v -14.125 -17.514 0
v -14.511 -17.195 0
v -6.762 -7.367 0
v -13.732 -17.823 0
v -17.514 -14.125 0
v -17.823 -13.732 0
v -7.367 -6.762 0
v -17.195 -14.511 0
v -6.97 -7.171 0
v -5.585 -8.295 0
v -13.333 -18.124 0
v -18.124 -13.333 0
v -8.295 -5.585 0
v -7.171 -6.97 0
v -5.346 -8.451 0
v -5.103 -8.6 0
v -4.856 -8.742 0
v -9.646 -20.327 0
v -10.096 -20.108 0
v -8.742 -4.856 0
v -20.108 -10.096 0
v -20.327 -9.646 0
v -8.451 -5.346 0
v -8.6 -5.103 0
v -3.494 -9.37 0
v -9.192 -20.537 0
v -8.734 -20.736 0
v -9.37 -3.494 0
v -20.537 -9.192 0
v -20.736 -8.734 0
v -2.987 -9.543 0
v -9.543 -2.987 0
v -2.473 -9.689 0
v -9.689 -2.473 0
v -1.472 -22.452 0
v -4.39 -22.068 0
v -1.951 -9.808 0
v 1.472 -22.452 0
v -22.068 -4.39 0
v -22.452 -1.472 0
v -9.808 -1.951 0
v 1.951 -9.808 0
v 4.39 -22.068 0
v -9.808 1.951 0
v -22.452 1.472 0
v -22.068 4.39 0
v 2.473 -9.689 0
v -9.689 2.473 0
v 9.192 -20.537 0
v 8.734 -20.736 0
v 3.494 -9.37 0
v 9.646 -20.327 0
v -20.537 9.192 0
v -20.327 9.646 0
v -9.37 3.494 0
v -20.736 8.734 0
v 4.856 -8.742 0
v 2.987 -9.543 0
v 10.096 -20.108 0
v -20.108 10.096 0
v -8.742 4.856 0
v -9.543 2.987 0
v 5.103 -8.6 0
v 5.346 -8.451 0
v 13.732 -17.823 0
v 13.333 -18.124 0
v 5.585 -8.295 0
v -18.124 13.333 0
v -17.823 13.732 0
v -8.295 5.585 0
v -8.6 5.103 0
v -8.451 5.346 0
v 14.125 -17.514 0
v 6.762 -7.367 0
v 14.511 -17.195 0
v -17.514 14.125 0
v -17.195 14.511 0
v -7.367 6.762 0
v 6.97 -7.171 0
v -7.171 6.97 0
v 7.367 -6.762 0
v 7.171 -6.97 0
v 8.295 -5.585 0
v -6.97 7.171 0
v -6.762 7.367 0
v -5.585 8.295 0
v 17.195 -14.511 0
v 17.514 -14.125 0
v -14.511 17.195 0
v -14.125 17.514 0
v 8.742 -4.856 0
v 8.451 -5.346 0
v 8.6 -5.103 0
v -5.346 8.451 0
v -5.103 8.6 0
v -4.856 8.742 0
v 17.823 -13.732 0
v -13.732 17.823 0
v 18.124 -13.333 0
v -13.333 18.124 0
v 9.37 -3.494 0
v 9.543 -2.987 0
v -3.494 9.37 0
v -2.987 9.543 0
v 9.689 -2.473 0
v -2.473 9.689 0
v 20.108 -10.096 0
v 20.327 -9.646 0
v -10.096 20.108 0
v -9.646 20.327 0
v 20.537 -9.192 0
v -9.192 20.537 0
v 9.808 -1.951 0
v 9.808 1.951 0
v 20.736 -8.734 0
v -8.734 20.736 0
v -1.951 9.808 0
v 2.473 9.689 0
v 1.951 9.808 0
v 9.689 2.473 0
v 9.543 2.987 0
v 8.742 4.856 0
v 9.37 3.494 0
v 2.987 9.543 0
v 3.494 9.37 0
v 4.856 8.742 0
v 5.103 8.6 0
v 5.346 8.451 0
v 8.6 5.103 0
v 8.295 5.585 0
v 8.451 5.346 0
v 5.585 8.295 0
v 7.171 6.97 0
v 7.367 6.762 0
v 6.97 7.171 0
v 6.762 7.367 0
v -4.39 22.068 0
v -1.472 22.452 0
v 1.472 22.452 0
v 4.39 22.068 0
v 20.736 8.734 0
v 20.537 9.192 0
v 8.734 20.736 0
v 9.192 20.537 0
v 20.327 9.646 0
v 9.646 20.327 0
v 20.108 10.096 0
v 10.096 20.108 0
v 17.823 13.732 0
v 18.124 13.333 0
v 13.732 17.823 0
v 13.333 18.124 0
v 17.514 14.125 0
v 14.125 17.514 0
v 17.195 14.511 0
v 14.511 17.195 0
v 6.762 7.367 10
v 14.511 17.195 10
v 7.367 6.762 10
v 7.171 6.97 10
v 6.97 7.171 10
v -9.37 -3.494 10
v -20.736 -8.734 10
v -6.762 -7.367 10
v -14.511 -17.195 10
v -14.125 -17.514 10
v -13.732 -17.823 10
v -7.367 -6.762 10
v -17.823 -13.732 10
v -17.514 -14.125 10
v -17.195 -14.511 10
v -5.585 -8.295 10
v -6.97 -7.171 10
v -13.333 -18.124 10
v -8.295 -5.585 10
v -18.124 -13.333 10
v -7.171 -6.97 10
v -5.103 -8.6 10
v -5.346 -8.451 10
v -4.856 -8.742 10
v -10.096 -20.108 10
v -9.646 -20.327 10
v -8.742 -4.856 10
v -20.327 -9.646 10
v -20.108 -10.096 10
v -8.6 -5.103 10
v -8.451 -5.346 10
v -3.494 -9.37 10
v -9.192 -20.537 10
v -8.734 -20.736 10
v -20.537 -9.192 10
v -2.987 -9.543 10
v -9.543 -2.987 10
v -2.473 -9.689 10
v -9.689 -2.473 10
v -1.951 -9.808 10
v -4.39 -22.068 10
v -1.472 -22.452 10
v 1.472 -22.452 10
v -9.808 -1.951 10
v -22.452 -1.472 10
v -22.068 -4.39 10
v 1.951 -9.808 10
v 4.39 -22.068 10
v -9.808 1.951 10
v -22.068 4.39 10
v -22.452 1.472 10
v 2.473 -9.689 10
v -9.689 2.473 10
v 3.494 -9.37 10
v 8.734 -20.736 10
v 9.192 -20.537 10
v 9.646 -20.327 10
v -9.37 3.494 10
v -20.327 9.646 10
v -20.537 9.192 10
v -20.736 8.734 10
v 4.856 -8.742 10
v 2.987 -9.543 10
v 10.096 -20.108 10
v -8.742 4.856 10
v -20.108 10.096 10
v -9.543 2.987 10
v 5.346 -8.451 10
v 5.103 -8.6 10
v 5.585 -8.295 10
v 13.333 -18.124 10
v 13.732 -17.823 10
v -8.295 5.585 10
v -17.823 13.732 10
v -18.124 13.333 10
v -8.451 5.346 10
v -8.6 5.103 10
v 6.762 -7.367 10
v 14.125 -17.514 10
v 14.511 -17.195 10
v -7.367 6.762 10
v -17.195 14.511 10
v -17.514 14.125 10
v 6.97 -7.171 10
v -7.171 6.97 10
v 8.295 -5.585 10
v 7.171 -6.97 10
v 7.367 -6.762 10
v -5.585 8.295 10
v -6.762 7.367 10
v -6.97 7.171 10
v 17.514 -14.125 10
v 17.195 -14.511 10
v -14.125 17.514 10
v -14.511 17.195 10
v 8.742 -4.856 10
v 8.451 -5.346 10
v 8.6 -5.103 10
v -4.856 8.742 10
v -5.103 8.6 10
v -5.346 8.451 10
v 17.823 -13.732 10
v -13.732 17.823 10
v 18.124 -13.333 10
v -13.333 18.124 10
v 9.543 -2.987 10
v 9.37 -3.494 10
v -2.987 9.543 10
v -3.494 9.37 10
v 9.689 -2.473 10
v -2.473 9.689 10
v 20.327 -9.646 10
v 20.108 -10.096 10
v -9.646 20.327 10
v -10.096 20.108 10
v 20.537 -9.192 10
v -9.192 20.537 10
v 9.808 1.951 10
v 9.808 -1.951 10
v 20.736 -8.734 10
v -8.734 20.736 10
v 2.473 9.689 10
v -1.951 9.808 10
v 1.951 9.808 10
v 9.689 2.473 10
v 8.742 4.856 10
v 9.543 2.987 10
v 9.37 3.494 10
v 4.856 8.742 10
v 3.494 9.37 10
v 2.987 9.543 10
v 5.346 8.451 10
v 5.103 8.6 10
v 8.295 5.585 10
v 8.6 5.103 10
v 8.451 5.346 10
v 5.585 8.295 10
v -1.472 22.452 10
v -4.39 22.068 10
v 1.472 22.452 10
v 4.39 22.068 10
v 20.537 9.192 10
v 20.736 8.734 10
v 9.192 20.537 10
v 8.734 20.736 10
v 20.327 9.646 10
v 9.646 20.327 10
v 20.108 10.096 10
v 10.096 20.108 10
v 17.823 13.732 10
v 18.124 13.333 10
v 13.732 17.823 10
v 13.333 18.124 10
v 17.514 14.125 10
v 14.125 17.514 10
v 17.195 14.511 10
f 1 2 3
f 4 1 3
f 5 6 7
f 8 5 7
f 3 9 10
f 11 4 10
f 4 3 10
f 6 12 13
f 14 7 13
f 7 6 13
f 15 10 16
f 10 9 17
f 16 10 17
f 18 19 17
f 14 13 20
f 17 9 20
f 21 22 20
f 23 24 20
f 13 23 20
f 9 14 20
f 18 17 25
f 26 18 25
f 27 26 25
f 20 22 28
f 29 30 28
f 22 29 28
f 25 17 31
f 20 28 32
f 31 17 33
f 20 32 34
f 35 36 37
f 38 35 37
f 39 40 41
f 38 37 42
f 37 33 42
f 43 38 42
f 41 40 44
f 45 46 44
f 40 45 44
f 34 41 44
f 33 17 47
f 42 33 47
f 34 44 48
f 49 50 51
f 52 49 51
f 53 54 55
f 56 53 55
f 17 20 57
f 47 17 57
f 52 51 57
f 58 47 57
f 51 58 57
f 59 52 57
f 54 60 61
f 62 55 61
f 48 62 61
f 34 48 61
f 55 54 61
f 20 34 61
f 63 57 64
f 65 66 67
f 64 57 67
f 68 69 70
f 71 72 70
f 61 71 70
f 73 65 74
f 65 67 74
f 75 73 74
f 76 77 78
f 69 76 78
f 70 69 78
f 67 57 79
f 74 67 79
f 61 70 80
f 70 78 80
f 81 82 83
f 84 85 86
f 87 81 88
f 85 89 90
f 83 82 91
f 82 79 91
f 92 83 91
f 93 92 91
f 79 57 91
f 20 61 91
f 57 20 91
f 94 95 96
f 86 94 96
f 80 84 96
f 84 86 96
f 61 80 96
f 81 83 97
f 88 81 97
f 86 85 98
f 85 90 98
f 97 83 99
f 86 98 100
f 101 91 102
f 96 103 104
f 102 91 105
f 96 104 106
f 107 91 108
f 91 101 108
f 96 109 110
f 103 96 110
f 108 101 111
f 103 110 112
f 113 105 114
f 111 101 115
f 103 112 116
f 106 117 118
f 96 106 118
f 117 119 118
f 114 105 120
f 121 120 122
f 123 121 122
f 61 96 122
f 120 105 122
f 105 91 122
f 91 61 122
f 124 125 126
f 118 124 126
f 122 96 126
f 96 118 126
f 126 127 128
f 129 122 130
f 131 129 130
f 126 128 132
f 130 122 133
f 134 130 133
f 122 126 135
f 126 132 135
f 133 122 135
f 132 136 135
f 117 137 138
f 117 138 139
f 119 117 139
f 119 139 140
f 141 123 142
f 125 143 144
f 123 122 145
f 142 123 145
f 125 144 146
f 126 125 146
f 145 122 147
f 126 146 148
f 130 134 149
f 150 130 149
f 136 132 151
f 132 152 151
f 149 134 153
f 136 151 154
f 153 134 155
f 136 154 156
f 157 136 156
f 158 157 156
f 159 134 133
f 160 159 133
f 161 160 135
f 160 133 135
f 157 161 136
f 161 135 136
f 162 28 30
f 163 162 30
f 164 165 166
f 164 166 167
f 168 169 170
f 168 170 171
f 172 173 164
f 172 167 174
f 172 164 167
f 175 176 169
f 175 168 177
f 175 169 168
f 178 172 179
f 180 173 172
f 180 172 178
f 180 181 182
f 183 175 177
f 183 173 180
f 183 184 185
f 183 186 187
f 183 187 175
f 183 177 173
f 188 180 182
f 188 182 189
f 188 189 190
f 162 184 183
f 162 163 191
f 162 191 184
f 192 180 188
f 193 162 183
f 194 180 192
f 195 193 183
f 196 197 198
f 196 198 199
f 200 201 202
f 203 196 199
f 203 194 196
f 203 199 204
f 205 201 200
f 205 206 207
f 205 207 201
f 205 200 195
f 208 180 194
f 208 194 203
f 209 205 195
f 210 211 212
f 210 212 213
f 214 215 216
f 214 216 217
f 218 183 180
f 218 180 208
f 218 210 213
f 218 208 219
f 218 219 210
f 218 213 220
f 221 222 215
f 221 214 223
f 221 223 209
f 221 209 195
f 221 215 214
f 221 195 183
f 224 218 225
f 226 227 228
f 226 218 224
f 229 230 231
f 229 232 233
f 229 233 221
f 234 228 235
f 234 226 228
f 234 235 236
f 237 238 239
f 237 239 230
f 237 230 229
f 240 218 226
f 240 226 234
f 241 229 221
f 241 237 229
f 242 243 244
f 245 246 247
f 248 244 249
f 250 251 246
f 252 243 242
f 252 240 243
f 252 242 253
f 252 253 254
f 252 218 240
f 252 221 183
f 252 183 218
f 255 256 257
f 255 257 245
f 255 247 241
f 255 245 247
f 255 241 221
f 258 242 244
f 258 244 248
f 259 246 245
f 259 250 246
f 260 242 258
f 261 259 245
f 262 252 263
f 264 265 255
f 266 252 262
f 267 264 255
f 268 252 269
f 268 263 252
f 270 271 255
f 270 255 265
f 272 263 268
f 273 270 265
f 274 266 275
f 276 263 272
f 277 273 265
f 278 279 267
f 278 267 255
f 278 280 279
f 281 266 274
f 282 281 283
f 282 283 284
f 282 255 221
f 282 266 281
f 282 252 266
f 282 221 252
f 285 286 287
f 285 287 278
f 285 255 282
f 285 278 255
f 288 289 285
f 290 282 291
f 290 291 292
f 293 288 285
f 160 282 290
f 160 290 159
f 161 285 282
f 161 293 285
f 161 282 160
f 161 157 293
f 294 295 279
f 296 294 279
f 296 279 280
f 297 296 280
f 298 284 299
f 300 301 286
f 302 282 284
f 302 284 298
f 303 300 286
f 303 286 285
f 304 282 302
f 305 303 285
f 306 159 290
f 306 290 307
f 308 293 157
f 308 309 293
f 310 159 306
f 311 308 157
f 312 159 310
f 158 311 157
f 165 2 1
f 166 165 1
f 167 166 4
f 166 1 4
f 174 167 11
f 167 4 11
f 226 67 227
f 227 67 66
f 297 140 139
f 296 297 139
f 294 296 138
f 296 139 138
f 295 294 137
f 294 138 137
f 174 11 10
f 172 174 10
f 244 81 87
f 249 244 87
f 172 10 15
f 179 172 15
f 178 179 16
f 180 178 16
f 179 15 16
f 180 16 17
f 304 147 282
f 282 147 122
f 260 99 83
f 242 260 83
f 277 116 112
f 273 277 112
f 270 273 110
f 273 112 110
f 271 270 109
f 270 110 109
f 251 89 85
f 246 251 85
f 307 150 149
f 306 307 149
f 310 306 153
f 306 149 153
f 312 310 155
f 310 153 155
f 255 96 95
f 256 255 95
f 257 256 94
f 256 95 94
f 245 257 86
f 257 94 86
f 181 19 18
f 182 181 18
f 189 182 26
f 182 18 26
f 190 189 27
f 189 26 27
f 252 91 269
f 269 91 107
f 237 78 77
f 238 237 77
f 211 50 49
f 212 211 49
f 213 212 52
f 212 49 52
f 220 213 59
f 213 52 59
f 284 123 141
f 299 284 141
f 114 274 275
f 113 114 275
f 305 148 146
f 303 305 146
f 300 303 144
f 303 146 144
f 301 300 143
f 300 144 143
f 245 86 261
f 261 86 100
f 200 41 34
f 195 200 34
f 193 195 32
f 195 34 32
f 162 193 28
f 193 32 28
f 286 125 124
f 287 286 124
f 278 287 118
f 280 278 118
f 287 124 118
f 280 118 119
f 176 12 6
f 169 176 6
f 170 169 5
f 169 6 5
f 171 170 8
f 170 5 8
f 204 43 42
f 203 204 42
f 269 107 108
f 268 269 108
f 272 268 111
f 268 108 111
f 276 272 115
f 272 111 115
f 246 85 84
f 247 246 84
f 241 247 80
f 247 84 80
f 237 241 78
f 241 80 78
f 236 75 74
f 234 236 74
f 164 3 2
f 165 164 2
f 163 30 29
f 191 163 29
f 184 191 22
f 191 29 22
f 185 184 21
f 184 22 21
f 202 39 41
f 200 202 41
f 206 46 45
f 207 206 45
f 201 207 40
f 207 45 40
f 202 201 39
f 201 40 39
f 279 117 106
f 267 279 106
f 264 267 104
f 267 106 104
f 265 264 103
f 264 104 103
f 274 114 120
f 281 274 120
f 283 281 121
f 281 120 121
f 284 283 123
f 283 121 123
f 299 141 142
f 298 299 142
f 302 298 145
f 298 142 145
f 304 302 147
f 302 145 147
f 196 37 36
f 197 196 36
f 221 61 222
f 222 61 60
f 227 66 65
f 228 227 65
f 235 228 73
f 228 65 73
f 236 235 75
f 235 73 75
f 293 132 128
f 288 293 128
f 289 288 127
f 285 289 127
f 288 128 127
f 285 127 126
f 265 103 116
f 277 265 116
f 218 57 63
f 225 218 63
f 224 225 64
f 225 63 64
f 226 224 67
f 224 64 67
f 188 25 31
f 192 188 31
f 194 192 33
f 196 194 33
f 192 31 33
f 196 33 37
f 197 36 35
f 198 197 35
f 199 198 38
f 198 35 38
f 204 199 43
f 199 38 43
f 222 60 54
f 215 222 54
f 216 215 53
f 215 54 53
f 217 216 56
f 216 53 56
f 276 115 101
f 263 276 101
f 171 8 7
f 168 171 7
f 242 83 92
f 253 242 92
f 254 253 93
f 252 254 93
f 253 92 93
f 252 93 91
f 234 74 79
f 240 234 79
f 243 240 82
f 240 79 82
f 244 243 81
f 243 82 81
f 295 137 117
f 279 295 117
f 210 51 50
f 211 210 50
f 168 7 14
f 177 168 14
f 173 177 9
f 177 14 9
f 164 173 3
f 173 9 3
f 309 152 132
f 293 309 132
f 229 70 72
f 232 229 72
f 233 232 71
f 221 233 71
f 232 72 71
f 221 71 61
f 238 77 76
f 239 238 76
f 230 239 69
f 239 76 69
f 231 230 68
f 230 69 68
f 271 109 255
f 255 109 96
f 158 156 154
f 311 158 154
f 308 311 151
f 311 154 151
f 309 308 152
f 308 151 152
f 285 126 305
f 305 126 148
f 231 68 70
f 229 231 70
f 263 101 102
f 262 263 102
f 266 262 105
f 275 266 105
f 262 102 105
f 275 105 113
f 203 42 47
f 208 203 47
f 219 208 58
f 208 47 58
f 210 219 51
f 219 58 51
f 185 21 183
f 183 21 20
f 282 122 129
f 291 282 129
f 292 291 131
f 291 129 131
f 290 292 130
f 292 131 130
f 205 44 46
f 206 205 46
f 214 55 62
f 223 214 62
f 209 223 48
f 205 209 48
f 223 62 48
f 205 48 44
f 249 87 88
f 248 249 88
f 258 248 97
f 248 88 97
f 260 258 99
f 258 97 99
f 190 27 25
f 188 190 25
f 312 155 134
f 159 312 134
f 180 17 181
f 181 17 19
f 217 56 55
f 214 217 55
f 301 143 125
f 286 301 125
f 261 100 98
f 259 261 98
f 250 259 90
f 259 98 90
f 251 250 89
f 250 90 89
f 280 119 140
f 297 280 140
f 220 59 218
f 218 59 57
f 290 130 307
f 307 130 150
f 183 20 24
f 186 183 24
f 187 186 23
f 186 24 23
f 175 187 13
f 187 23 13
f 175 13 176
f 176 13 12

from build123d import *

# Parameters (mm, degrees)
F1_DEPTH = 10
F3_DEPTH = 10.001


with BuildPart() as f1:
    # F0 (on Top) → F1 (new body)
    with BuildSketch(Plane.XY):
        with BuildLine():
            Line((1.950903, 9.807853), (4.389532, 22.067669))
            ThreePointArc((4.389532, 22.067669), (0, 22.5), (-4.389532, 22.067669))
            Line((-4.389532, 22.067669), (-1.950903, 9.807853))
            ThreePointArc((-1.950903, 9.807853), (-2.731096, 9.619829), (-3.493699, 9.369849))
            Line((-3.493699, 9.369849), (-8.733502, 20.735861))
            ThreePointArc((-8.733502, 20.735861), (-9.419844, 20.433221), (-10.095717, 20.107872))
            Line((-10.095717, 20.107872), (-4.855913, 8.741859))
            ThreePointArc((-4.855913, 8.741859), (-5.224986, 8.526402), (-5.584515, 8.295372))
            Line((-5.584515, 8.295372), (-13.332885, 18.124132))
            ThreePointArc((-13.332885, 18.124132), (-13.929614, 17.669631), (-14.510861, 17.195491))
            Line((-14.510861, 17.195491), (-6.762491, 7.366731))
            ThreePointArc((-6.762491, 7.366731), (-7.071068, 7.071068), (-7.366731, 6.762491))
            Line((-7.366731, 6.762491), (-17.195491, 14.510861))
            ThreePointArc((-17.195491, 14.510861), (-17.669631, 13.929614), (-18.124132, 13.332885))
            Line((-18.124132, 13.332885), (-8.295372, 5.584515))
            ThreePointArc((-8.295372, 5.584515), (-8.526402, 5.224986), (-8.741859, 4.855913))
            Line((-8.741859, 4.855913), (-20.107872, 10.095717))
            ThreePointArc((-20.107872, 10.095717), (-20.433221, 9.419844), (-20.735861, 8.733502))
            Line((-20.735861, 8.733502), (-9.369849, 3.493699))
            ThreePointArc((-9.369849, 3.493699), (-9.619829, 2.731096), (-9.807853, 1.950903))
            Line((-9.807853, 1.950903), (-22.067669, 4.389532))
            ThreePointArc((-22.067669, 4.389532), (-22.5, 0), (-22.067669, -4.389532))
            Line((-22.067669, -4.389532), (-9.807853, -1.950903))
            ThreePointArc((-9.807853, -1.950903), (-9.619829, -2.731096), (-9.369849, -3.493699))
            Line((-9.369849, -3.493699), (-20.735861, -8.733502))
            ThreePointArc((-20.735861, -8.733502), (-20.433221, -9.419844), (-20.107872, -10.095717))
            Line((-20.107872, -10.095717), (-8.741859, -4.855913))
            ThreePointArc((-8.741859, -4.855913), (-8.526402, -5.224986), (-8.295372, -5.584515))
            Line((-8.295372, -5.584515), (-18.124132, -13.332885))
            ThreePointArc((-18.124132, -13.332885), (-17.669631, -13.929614), (-17.195491, -14.510861))
            Line((-17.195491, -14.510861), (-7.366731, -6.762491))
            ThreePointArc((-7.366731, -6.762491), (-7.071068, -7.071068), (-6.762491, -7.366731))
            Line((-6.762491, -7.366731), (-14.510861, -17.195491))
            ThreePointArc((-14.510861, -17.195491), (-13.929614, -17.669631), (-13.332885, -18.124132))
            Line((-13.332885, -18.124132), (-5.584515, -8.295372))
            ThreePointArc((-5.584515, -8.295372), (-5.224986, -8.526402), (-4.855913, -8.741859))
            Line((-4.855913, -8.741859), (-10.095717, -20.107872))
            ThreePointArc((-10.095717, -20.107872), (-9.419844, -20.433221), (-8.733502, -20.735861))
            Line((-8.733502, -20.735861), (-3.493699, -9.369849))
            ThreePointArc((-3.493699, -9.369849), (-2.731096, -9.619829), (-1.950903, -9.807853))
            Line((-1.950903, -9.807853), (-4.389532, -22.067669))
            ThreePointArc((-4.389532, -22.067669), (0, -22.5), (4.389532, -22.067669))
            Line((4.389532, -22.067669), (1.950903, -9.807853))
            ThreePointArc((1.950903, -9.807853), (2.731096, -9.619829), (3.493699, -9.369849))
            Line((3.493699, -9.369849), (8.733502, -20.735861))
            ThreePointArc((8.733502, -20.735861), (9.419844, -20.433221), (10.095717, -20.107872))
            Line((10.095717, -20.107872), (4.855913, -8.741859))
            ThreePointArc((4.855913, -8.741859), (5.224986, -8.526402), (5.584515, -8.295372))
            Line((5.584515, -8.295372), (13.332885, -18.124132))
            ThreePointArc((13.332885, -18.124132), (13.929614, -17.669631), (14.510861, -17.195491))
            Line((14.510861, -17.195491), (6.762491, -7.366731))
            ThreePointArc((6.762491, -7.366731), (7.071068, -7.071068), (7.366731, -6.762491))
            Line((7.366731, -6.762491), (17.195491, -14.510861))
            ThreePointArc((17.195491, -14.510861), (17.669631, -13.929614), (18.124132, -13.332885))
            Line((18.124132, -13.332885), (8.295372, -5.584515))
            ThreePointArc((8.295372, -5.584515), (8.526402, -5.224986), (8.741859, -4.855913))
            Line((8.741859, -4.855913), (20.107872, -10.095717))
            ThreePointArc((20.107872, -10.095717), (20.433221, -9.419844), (20.735861, -8.733502))
            Line((20.735861, -8.733502), (9.369849, -3.493699))
            ThreePointArc((9.369849, -3.493699), (9.619829, -2.731096), (9.807853, -1.950903))
            Line((9.807853, -1.950903), (22.067669, -4.389532))
            ThreePointArc((22.067669, -4.389532), (22.5, 0), (22.067669, 4.389532))
            Line((22.067669, 4.389532), (9.807853, 1.950903))
            ThreePointArc((9.807853, 1.950903), (9.619829, 2.731096), (9.369849, 3.493699))
            Line((9.369849, 3.493699), (20.735861, 8.733502))
            ThreePointArc((20.735861, 8.733502), (20.433221, 9.419844), (20.107872, 10.095717))
            Line((20.107872, 10.095717), (8.741859, 4.855913))
            ThreePointArc((8.741859, 4.855913), (8.526402, 5.224986), (8.295372, 5.584515))
            Line((8.295372, 5.584515), (18.124132, 13.332885))
            ThreePointArc((18.124132, 13.332885), (17.669631, 13.929614), (17.195491, 14.510861))
            Line((17.195491, 14.510861), (7.366731, 6.762491))
            ThreePointArc((7.366731, 6.762491), (7.071068, 7.071068), (6.762491, 7.366731))
            Line((6.762491, 7.366731), (14.510861, 17.195491))
            ThreePointArc((14.510861, 17.195491), (13.929614, 17.669631), (13.332885, 18.124132))
            Line((13.332885, 18.124132), (5.584515, 8.295372))
            ThreePointArc((5.584515, 8.295372), (5.224986, 8.526402), (4.855913, 8.741859))
            Line((4.855913, 8.741859), (10.095717, 20.107872))
            ThreePointArc((10.095717, 20.107872), (9.419844, 20.433221), (8.733502, 20.735861))
            Line((8.733502, 20.735861), (3.493699, 9.369849))
            ThreePointArc((3.493699, 9.369849), (2.731096, 9.619829), (1.950903, 9.807853))
        make_face()
    extrude(amount=F1_DEPTH)

    # F2 (on face) → F3 (cut, through all)
    with BuildSketch(Plane.XY.offset(10)):
        with BuildLine():
            Line((22.067669, 4.389532), (9.807853, 1.950903))
            Line((9.807853, 1.950903), (9.807853, -1.950903))
            Line((9.807853, -1.950903), (22.067669, -4.389532))
            ThreePointArc((22.067669, -4.389532), (22.5, 0), (22.067669, 4.389532))
        make_face()
    extrude(amount=-F3_DEPTH, mode=Mode.SUBTRACT)


solid = f1.part
